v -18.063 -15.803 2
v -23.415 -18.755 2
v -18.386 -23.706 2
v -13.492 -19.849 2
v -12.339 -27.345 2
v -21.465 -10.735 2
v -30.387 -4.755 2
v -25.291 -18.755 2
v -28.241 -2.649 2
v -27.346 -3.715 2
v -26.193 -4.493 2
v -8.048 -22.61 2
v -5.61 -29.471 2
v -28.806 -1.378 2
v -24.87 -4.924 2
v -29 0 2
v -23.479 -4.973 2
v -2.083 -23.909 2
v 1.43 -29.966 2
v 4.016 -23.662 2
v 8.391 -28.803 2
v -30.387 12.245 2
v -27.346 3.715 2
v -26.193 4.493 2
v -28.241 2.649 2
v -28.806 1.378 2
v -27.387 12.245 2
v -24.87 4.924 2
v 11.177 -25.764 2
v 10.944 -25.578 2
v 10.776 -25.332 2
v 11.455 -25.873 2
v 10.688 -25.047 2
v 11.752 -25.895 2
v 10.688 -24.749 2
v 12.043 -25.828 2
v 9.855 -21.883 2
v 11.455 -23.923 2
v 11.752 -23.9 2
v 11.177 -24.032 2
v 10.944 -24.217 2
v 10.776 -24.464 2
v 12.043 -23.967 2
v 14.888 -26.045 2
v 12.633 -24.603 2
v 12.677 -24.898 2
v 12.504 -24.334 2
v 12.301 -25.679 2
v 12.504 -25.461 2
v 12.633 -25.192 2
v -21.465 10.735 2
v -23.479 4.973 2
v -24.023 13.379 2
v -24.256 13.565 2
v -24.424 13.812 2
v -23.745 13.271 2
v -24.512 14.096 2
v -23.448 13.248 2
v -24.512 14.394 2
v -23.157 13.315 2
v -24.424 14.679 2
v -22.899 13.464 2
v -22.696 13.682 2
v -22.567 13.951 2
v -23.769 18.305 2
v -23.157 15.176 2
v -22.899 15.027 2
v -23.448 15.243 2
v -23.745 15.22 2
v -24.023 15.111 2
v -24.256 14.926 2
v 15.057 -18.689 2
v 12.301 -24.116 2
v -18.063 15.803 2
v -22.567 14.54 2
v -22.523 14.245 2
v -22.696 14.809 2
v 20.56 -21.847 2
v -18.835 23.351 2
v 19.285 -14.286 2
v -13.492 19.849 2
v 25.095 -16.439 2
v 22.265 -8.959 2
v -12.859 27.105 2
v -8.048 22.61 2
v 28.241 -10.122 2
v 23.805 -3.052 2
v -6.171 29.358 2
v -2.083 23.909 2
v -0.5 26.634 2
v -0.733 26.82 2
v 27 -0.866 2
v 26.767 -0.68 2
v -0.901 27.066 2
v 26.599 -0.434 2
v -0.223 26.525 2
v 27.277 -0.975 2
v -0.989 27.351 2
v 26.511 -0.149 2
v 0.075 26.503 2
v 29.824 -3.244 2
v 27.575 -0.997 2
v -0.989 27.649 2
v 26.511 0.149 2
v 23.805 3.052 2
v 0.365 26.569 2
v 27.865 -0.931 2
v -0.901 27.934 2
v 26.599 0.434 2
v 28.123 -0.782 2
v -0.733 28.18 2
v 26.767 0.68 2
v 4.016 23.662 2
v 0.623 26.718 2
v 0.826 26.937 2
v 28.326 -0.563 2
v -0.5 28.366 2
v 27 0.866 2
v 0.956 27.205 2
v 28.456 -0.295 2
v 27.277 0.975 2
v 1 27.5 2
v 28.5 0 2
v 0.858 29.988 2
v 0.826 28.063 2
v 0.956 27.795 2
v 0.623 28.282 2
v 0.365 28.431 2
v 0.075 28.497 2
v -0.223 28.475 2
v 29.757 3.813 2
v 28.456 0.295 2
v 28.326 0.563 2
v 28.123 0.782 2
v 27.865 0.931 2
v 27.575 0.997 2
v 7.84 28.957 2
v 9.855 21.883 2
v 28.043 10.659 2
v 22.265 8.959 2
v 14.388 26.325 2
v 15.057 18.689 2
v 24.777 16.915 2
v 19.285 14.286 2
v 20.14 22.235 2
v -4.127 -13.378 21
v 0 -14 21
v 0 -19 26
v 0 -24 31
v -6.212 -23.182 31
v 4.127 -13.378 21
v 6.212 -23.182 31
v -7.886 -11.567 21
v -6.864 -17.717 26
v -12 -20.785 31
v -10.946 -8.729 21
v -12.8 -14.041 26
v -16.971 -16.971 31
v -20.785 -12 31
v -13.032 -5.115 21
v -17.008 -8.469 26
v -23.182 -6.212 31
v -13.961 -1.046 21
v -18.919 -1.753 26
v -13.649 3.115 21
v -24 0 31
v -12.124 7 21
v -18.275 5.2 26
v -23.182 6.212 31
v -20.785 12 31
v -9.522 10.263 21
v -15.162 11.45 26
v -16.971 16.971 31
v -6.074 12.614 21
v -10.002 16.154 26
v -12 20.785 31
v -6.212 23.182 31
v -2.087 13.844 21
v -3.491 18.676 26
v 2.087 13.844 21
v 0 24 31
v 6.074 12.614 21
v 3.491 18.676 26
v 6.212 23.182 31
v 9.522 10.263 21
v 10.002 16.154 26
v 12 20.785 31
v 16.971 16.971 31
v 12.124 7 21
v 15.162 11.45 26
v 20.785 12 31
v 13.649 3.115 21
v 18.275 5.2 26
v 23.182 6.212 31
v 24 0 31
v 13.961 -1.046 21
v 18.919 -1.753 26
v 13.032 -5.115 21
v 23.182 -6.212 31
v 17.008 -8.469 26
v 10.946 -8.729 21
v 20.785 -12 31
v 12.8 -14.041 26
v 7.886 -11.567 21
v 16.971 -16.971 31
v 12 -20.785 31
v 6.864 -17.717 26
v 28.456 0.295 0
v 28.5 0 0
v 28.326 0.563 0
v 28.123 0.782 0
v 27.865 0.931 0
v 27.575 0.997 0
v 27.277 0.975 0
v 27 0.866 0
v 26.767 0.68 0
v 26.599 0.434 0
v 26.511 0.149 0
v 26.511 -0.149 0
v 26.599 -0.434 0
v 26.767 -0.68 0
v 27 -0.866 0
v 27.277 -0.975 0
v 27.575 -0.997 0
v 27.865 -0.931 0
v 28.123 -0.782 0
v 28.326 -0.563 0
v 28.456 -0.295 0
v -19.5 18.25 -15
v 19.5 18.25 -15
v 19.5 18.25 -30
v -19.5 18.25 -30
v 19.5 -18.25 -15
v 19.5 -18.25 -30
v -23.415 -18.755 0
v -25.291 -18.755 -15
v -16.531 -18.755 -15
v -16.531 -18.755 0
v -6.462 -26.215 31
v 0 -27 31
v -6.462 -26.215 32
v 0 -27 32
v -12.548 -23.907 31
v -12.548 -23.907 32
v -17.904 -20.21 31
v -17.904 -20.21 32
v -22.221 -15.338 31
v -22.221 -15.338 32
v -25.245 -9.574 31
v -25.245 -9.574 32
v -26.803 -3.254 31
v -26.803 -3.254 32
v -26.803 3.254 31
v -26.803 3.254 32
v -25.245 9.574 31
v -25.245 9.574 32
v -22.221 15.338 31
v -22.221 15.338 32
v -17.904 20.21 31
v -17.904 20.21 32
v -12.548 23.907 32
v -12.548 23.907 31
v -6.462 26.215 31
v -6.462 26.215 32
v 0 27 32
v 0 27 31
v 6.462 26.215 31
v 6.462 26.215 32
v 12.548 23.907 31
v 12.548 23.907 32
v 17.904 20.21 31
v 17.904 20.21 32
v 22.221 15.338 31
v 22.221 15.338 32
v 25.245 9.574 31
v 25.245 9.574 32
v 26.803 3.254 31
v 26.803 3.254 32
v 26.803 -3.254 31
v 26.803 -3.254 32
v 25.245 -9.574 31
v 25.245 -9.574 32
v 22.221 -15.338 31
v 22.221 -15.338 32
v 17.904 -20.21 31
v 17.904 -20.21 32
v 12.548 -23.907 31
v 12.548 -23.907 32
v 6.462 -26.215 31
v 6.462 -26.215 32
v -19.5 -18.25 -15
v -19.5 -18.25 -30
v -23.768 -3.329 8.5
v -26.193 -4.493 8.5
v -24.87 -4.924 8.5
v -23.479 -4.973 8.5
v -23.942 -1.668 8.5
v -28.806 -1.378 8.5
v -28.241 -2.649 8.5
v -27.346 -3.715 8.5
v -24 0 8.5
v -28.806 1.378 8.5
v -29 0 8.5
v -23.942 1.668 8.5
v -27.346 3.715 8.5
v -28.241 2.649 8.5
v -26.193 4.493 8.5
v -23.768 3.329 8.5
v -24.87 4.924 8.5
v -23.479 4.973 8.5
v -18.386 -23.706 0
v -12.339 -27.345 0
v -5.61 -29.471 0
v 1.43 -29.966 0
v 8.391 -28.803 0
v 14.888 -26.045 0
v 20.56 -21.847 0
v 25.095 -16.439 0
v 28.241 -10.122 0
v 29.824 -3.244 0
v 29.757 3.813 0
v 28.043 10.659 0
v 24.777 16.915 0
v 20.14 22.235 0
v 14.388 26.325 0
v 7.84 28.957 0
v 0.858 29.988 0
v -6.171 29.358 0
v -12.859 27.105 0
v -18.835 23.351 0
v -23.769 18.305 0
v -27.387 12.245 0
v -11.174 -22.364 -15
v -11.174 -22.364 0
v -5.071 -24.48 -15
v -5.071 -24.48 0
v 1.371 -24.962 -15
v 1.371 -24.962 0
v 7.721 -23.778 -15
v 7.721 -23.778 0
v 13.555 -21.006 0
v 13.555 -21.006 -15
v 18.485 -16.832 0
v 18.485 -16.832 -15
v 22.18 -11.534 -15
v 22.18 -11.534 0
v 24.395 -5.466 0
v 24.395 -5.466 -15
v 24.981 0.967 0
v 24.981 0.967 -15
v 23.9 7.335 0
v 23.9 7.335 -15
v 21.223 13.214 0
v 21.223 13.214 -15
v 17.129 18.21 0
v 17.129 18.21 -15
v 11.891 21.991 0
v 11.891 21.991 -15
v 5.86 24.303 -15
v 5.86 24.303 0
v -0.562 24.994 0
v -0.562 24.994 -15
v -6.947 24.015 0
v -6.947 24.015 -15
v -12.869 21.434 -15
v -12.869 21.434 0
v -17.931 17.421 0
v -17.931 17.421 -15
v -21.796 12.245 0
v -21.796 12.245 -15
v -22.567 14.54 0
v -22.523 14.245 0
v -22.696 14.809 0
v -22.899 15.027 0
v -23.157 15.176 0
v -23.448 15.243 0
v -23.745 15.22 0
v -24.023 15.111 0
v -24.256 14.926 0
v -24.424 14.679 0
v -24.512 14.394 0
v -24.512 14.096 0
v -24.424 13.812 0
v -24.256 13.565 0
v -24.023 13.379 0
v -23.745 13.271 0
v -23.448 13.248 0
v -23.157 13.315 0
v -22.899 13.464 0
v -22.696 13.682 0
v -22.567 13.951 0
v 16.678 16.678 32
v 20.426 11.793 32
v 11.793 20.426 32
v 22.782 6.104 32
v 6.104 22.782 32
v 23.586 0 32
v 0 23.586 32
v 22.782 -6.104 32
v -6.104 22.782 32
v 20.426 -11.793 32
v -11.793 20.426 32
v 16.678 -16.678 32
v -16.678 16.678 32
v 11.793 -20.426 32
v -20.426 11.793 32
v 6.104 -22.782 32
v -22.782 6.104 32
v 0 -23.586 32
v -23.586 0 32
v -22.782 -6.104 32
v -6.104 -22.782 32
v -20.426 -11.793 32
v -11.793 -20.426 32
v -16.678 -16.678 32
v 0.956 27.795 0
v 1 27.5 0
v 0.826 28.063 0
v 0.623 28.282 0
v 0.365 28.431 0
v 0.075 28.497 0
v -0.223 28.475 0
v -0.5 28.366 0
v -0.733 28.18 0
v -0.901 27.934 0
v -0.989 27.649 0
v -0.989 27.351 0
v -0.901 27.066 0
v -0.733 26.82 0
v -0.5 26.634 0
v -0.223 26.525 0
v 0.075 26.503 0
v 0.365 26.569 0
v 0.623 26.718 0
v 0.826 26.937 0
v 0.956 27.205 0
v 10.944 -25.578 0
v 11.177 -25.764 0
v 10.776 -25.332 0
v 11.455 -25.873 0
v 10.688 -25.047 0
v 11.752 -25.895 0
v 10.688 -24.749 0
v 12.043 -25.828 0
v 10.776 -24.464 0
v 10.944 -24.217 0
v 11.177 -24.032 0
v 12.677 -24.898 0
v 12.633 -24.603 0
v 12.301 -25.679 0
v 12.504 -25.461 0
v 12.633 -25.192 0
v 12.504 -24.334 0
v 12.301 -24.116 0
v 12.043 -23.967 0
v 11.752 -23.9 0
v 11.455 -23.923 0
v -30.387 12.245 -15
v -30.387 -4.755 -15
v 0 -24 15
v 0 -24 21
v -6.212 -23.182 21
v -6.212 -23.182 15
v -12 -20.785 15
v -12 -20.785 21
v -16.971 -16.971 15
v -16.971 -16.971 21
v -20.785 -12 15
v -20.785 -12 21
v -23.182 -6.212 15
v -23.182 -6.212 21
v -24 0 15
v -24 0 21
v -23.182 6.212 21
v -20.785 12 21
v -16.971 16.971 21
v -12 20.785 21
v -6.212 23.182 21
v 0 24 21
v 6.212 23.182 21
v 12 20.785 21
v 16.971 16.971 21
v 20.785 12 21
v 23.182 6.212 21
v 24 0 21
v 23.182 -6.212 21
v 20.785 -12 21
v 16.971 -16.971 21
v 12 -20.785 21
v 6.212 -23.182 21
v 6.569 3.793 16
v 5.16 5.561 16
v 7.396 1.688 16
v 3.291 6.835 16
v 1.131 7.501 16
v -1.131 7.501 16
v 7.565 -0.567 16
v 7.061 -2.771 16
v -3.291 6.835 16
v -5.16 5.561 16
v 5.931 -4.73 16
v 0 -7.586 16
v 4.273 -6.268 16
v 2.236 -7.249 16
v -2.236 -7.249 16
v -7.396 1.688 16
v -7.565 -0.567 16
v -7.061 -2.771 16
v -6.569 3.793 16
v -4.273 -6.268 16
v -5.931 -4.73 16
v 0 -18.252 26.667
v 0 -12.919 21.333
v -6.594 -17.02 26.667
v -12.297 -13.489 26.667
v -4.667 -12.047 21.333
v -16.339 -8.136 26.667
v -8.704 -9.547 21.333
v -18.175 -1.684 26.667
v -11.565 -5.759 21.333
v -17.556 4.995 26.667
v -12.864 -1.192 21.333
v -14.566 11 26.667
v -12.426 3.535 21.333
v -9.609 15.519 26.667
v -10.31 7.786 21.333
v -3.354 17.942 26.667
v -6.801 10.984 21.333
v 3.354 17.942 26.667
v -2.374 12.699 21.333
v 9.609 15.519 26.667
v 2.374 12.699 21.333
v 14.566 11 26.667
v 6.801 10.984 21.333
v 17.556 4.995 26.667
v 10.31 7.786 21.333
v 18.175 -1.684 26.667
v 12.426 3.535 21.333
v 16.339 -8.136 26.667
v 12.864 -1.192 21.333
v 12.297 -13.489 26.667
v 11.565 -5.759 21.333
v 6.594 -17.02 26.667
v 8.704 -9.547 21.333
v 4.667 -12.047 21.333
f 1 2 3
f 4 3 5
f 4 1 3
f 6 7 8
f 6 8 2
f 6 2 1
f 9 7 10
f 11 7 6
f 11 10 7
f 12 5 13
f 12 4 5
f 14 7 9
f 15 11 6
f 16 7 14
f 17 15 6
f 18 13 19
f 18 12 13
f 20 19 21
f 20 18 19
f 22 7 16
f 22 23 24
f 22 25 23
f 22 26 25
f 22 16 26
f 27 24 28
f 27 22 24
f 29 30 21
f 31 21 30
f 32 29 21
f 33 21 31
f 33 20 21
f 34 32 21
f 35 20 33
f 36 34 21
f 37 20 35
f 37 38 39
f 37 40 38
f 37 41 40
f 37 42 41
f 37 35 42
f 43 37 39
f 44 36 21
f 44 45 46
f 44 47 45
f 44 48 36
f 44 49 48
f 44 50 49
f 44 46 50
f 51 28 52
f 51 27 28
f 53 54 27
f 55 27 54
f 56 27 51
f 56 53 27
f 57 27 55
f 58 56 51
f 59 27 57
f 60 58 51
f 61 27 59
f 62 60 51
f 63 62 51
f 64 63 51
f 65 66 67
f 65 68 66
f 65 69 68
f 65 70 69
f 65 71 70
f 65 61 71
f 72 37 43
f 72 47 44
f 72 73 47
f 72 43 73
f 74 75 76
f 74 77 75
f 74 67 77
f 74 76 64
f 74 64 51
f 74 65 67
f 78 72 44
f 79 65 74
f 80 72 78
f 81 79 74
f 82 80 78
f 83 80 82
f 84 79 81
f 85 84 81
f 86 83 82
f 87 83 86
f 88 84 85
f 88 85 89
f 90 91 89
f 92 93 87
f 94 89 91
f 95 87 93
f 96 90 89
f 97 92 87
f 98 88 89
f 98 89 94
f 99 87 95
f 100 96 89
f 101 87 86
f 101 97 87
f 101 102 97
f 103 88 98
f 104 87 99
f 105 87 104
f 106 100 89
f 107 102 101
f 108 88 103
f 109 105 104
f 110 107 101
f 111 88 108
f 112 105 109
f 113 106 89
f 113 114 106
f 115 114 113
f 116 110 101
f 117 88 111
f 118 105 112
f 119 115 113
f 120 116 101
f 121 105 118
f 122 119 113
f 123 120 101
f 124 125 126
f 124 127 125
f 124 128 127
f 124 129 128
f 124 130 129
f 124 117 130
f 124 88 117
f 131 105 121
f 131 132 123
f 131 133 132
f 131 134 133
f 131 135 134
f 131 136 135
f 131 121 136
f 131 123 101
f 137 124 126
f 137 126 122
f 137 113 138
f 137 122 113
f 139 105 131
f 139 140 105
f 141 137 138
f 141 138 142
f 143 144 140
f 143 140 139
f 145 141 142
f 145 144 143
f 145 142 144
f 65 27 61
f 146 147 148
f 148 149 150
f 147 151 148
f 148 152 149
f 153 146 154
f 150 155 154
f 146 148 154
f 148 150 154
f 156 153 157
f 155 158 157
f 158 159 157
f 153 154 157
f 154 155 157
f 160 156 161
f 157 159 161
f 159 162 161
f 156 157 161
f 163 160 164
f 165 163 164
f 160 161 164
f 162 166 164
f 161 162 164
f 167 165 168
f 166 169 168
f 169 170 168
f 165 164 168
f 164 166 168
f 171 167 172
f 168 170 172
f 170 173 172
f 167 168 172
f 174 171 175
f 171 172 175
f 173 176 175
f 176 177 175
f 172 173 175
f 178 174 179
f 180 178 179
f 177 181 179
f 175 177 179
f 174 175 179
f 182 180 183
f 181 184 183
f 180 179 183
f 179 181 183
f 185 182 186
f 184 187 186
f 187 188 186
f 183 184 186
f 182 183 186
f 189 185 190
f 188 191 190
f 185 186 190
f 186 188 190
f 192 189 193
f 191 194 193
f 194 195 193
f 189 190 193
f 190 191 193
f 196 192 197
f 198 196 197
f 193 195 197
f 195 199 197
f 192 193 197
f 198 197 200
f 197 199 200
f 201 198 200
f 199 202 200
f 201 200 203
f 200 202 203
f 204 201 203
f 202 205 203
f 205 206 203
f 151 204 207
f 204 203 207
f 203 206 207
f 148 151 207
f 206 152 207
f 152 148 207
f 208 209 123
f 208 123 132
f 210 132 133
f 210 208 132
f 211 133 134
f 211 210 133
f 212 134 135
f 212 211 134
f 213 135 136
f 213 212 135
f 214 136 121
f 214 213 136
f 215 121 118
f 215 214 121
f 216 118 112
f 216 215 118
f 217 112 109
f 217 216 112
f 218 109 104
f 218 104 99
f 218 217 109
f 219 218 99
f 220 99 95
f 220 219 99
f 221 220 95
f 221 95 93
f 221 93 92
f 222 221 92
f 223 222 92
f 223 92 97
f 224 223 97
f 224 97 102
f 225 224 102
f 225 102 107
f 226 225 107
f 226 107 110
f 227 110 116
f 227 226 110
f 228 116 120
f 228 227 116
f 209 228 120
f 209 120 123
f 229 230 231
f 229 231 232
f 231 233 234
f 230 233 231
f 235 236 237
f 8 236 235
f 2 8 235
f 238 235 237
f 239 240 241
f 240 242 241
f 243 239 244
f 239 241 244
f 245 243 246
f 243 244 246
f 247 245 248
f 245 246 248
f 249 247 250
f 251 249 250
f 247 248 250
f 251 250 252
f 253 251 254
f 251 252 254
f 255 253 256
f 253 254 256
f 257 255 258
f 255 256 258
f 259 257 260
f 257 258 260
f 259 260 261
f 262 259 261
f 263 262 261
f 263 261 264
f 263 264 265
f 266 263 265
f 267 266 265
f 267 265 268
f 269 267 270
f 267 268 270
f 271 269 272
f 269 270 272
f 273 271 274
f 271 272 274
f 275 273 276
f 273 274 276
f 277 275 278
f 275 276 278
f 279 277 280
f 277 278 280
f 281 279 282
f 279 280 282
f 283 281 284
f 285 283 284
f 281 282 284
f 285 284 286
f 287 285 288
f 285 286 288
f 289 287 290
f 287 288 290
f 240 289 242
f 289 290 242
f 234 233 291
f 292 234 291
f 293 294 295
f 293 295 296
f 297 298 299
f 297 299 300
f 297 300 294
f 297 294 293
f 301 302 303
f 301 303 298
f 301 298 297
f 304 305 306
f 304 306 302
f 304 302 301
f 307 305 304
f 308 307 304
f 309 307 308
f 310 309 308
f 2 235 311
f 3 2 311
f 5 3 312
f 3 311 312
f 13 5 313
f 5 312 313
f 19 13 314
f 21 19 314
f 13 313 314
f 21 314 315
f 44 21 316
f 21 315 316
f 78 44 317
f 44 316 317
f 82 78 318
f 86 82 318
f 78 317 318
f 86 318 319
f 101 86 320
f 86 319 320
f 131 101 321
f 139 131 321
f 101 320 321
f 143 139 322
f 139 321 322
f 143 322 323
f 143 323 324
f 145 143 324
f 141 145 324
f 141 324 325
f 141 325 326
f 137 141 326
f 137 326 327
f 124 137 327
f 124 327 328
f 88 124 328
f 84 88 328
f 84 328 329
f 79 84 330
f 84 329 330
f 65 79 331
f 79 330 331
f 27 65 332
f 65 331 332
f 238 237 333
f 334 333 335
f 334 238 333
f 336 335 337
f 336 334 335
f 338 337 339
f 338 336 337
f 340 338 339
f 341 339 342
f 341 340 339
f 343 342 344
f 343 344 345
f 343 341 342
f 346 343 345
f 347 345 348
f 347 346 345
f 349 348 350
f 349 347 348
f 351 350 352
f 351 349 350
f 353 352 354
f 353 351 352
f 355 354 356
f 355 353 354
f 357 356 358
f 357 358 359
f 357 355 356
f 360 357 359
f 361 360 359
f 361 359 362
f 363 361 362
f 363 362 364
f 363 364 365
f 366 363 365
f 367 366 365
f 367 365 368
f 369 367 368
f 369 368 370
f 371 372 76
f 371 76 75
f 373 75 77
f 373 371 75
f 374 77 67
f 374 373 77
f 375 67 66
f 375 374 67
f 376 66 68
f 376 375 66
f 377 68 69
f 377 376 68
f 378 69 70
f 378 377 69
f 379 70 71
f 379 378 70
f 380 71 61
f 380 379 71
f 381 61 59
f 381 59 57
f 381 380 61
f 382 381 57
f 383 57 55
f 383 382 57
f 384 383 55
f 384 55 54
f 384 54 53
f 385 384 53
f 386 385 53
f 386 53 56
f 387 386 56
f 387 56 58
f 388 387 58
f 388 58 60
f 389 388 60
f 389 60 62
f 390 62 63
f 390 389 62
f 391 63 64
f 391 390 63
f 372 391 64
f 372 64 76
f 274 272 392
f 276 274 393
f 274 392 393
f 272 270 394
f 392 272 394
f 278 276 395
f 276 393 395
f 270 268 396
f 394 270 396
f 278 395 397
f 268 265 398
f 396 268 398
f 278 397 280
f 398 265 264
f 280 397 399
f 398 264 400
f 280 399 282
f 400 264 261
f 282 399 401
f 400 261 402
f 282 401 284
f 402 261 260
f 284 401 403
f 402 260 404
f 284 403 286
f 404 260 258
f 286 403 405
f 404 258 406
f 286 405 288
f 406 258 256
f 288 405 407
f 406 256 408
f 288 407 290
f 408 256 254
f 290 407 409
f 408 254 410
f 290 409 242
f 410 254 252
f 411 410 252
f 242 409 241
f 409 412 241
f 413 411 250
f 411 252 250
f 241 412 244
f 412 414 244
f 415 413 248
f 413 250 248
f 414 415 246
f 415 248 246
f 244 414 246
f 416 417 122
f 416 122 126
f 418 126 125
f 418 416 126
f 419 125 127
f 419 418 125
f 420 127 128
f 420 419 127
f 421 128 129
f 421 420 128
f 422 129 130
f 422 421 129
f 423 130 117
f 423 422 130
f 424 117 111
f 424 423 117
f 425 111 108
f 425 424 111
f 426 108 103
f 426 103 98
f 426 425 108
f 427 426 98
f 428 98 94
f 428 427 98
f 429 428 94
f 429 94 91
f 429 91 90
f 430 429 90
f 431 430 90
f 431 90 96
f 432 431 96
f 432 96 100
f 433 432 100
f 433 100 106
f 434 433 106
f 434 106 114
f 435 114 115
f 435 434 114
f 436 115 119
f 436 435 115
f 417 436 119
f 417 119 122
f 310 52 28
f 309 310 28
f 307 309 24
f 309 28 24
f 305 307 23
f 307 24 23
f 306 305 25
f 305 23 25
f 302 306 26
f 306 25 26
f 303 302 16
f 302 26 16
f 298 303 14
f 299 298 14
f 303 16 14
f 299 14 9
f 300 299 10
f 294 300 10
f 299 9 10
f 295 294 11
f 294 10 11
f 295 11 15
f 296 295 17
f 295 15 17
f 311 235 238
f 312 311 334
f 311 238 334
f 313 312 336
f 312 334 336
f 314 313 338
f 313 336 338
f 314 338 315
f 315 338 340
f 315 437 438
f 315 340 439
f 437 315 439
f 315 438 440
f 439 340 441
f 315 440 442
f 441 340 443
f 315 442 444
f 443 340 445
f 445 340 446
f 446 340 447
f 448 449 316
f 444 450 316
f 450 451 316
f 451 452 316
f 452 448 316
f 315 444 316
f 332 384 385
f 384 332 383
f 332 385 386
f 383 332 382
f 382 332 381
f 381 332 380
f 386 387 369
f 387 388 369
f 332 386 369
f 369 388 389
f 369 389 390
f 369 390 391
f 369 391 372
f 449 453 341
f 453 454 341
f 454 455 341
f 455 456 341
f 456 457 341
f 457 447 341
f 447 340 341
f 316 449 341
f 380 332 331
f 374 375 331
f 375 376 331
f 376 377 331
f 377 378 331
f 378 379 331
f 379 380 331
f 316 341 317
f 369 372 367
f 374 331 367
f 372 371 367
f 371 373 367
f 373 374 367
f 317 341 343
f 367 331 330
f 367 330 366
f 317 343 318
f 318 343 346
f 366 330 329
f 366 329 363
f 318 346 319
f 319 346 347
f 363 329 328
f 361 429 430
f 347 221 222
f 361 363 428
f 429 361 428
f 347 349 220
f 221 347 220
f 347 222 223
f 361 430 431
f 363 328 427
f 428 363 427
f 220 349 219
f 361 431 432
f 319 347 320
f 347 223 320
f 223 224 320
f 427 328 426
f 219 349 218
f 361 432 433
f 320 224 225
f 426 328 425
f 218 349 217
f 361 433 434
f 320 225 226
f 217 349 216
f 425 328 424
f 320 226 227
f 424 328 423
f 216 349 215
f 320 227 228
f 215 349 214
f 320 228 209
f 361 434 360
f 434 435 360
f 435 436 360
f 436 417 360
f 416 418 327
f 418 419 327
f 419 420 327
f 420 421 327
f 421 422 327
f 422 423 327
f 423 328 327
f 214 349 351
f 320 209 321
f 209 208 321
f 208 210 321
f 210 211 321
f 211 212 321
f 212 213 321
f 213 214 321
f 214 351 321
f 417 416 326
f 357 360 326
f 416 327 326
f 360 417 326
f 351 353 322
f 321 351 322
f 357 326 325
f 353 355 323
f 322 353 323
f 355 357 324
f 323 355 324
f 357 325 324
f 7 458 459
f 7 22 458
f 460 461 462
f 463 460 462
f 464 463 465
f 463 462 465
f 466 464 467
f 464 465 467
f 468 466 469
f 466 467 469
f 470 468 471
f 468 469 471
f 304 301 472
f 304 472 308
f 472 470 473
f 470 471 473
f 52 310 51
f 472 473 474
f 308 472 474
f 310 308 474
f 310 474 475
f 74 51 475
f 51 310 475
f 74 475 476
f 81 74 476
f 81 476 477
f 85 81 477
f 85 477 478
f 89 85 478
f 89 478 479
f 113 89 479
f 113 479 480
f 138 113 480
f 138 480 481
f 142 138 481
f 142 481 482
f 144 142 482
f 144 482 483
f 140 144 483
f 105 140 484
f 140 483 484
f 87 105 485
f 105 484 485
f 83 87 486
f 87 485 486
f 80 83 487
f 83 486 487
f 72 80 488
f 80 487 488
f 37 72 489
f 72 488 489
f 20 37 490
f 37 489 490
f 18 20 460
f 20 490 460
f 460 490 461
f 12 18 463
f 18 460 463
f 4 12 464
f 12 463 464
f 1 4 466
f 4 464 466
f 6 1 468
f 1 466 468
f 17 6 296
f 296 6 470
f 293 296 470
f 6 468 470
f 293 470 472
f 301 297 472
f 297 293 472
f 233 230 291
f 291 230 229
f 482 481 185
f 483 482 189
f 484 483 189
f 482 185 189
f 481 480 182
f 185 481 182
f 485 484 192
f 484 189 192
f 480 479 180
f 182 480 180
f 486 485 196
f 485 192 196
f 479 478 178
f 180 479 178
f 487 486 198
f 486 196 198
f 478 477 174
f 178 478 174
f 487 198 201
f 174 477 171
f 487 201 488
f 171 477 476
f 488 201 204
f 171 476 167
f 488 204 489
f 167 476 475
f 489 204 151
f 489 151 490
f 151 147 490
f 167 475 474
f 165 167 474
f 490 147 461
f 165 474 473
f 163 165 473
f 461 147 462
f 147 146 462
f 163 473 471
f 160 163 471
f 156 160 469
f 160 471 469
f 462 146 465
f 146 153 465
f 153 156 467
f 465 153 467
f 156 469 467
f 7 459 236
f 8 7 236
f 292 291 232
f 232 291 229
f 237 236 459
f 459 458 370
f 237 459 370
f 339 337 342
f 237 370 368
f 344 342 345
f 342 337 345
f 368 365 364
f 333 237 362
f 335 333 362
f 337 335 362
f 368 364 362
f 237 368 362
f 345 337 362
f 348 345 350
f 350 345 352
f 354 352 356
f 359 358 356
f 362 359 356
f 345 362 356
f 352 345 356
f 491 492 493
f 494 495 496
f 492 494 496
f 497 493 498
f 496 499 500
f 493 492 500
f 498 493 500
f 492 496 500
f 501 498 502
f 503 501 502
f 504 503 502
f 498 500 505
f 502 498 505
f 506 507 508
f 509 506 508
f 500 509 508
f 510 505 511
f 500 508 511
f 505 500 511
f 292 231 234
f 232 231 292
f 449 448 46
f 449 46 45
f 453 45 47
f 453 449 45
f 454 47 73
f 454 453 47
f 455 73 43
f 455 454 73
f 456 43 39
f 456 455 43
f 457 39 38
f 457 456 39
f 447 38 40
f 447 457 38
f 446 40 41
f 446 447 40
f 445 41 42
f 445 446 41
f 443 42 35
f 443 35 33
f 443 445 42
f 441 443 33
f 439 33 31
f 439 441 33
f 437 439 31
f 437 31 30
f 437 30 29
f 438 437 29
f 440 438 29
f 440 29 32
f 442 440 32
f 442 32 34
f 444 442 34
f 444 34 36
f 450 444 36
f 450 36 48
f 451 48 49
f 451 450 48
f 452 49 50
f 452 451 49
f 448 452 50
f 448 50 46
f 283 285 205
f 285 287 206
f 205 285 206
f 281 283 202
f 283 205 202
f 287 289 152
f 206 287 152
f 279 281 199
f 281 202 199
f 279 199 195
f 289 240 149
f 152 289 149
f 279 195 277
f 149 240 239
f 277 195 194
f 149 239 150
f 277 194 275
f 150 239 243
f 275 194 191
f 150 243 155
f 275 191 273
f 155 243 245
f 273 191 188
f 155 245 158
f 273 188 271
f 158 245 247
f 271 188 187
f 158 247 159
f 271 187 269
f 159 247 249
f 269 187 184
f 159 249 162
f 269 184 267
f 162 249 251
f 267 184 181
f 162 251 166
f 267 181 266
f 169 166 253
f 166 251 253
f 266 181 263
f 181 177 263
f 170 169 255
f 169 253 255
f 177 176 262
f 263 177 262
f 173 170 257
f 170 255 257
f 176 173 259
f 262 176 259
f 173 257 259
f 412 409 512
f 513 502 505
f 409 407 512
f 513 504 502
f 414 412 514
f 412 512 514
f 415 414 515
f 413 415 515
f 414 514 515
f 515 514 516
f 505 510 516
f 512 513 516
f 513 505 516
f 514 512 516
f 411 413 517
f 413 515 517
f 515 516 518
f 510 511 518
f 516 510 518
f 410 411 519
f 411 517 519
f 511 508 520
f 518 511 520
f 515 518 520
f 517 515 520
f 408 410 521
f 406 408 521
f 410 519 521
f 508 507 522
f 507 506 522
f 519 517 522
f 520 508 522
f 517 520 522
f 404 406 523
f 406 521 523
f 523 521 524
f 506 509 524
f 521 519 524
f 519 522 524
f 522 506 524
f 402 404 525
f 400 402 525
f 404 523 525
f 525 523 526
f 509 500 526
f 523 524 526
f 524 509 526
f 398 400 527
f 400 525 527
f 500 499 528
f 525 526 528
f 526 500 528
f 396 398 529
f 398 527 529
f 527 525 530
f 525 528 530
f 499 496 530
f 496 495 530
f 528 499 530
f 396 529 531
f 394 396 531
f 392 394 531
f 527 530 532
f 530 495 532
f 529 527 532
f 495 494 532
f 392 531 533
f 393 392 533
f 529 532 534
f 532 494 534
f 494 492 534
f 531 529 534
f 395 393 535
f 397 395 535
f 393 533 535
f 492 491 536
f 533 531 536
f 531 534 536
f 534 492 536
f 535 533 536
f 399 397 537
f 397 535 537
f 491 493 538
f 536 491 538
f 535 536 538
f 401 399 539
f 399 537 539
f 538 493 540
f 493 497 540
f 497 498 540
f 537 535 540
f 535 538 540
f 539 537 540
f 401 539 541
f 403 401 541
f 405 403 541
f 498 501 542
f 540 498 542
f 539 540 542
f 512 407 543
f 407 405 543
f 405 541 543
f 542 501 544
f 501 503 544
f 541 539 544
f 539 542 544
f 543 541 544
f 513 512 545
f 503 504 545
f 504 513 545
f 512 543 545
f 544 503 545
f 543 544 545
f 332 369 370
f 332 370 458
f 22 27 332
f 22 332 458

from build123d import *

# Parameters (mm, degrees)
SKETCH1_R           = 1
BOSS_EXTRUDE1_DEPTH = 2
BOSS_EXTRUDE2_DEPTH = 15
SKETCH3_W           = 39
SKETCH3_H           = 36.5
BOSS_EXTRUDE3_DEPTH = 15
SKETCH4_R           = 24
BOSS_EXTRUDE4_DEPTH = 13
SKETCH6_R           = 5
BOSS_EXTRUDE5_DEPTH = 6.5


with BuildPart() as part:
    # Sketch1 → Boss-Extrude1 (new body)
    with BuildSketch(Plane.XY):
        with BuildLine():
            Line((-27.387019607, 12.245454545), (-30.387019607, 12.245454545))
            Line((-30.387019607, 12.245454545), (-30.387019607, -4.754545455))
            Line((-30.387019607, -4.754545455), (-25.291436328, -18.754545455))
            Line((-25.291436328, -18.754545455), (-23.415102494, -18.754545455))
            ThreePointArc((-23.415102494, -18.754545455), (29.756745496, 3.812623441), (-27.387019607, 12.245454545))
        make_face()
        with Locations((0, 27.5)):
            Circle(SKETCH1_R, mode=Mode.SUBTRACT)
        with Locations((-23.5226917, 14.245454545)):
            Circle(SKETCH1_R, mode=Mode.SUBTRACT)
        with Locations((27.5, 0)):
            Circle(SKETCH1_R, mode=Mode.SUBTRACT)
        with Locations((11.677272727, -24.897616385)):
            Circle(SKETCH1_R, mode=Mode.SUBTRACT)
    extrude(amount=BOSS_EXTRUDE1_DEPTH)

    # Sketch2 → Boss-Extrude2 (add)
    with BuildSketch(Plane(origin=(0, 0, 0), x_dir=(-1, 0, 0), z_dir=(0, 0, -1))):
        with BuildLine():
            Line((25.291436328, -18.754545455), (23.415102494, -18.754545455))
            Line((23.415102494, -18.754545455), (16.530790205, -18.754545455))
            ThreePointArc((16.530790205, -18.754545455), (-24.647075653, 4.185888405), (21.795615224, 12.245454545))
            Line((21.795615224, 12.245454545), (27.387019607, 12.245454545))
            Line((27.387019607, 12.245454545), (30.387019607, 12.245454545))
            Line((30.387019607, 12.245454545), (30.387019607, -4.754545455))
            Line((30.387019607, -4.754545455), (25.291436328, -18.754545455))
        make_face()
    extrude(amount=BOSS_EXTRUDE2_DEPTH)

    # Sketch4 → Boss-Extrude4 (add)
    with BuildSketch(Plane.XY.offset(2)):
        with Locations(Location((0, 0, 0), (0, 0, 180))):
            Circle(SKETCH4_R)
    extrude(amount=BOSS_EXTRUDE4_DEPTH)

    # Sketch5 → Revolve1 (revolve)
    with BuildSketch(Plane(origin=(0, 0, 0), x_dir=(0, 0, -1), z_dir=(1, 0, 0)), mode=Mode.PRIVATE) as revolve1_sk:
        Polygon((-15, 0), (-15, 24), (-21, 24), (-21, 14), (-31, 24), (-31, 27), (-32, 27), (-32, 23.585786438), (-16, 7.585786438), (-16, 0), align=None)
    revolve(revolve1_sk.sketch.rotate(Axis((0, 0, 16), (0, 0, -1)), 180), axis=Axis((0, 0, 16), (0, 0, -1)))

    # Sketch6 → Boss-Extrude5 (add)
    with BuildSketch(Plane.XY.offset(2)):
        with Locations((-24, 0)):
            Circle(SKETCH6_R)
    extrude(amount=BOSS_EXTRUDE5_DEPTH)


with BuildPart() as body_2:
    # Sketch3 → Boss-Extrude3 (new body)
    with BuildSketch(Plane(origin=(0, 0, -15), x_dir=(-1, 0, 0), z_dir=(0, 0, -1))):
        Rectangle(SKETCH3_W, SKETCH3_H)
    extrude(amount=BOSS_EXTRUDE3_DEPTH)


solid = Compound([part.part, body_2.part])
